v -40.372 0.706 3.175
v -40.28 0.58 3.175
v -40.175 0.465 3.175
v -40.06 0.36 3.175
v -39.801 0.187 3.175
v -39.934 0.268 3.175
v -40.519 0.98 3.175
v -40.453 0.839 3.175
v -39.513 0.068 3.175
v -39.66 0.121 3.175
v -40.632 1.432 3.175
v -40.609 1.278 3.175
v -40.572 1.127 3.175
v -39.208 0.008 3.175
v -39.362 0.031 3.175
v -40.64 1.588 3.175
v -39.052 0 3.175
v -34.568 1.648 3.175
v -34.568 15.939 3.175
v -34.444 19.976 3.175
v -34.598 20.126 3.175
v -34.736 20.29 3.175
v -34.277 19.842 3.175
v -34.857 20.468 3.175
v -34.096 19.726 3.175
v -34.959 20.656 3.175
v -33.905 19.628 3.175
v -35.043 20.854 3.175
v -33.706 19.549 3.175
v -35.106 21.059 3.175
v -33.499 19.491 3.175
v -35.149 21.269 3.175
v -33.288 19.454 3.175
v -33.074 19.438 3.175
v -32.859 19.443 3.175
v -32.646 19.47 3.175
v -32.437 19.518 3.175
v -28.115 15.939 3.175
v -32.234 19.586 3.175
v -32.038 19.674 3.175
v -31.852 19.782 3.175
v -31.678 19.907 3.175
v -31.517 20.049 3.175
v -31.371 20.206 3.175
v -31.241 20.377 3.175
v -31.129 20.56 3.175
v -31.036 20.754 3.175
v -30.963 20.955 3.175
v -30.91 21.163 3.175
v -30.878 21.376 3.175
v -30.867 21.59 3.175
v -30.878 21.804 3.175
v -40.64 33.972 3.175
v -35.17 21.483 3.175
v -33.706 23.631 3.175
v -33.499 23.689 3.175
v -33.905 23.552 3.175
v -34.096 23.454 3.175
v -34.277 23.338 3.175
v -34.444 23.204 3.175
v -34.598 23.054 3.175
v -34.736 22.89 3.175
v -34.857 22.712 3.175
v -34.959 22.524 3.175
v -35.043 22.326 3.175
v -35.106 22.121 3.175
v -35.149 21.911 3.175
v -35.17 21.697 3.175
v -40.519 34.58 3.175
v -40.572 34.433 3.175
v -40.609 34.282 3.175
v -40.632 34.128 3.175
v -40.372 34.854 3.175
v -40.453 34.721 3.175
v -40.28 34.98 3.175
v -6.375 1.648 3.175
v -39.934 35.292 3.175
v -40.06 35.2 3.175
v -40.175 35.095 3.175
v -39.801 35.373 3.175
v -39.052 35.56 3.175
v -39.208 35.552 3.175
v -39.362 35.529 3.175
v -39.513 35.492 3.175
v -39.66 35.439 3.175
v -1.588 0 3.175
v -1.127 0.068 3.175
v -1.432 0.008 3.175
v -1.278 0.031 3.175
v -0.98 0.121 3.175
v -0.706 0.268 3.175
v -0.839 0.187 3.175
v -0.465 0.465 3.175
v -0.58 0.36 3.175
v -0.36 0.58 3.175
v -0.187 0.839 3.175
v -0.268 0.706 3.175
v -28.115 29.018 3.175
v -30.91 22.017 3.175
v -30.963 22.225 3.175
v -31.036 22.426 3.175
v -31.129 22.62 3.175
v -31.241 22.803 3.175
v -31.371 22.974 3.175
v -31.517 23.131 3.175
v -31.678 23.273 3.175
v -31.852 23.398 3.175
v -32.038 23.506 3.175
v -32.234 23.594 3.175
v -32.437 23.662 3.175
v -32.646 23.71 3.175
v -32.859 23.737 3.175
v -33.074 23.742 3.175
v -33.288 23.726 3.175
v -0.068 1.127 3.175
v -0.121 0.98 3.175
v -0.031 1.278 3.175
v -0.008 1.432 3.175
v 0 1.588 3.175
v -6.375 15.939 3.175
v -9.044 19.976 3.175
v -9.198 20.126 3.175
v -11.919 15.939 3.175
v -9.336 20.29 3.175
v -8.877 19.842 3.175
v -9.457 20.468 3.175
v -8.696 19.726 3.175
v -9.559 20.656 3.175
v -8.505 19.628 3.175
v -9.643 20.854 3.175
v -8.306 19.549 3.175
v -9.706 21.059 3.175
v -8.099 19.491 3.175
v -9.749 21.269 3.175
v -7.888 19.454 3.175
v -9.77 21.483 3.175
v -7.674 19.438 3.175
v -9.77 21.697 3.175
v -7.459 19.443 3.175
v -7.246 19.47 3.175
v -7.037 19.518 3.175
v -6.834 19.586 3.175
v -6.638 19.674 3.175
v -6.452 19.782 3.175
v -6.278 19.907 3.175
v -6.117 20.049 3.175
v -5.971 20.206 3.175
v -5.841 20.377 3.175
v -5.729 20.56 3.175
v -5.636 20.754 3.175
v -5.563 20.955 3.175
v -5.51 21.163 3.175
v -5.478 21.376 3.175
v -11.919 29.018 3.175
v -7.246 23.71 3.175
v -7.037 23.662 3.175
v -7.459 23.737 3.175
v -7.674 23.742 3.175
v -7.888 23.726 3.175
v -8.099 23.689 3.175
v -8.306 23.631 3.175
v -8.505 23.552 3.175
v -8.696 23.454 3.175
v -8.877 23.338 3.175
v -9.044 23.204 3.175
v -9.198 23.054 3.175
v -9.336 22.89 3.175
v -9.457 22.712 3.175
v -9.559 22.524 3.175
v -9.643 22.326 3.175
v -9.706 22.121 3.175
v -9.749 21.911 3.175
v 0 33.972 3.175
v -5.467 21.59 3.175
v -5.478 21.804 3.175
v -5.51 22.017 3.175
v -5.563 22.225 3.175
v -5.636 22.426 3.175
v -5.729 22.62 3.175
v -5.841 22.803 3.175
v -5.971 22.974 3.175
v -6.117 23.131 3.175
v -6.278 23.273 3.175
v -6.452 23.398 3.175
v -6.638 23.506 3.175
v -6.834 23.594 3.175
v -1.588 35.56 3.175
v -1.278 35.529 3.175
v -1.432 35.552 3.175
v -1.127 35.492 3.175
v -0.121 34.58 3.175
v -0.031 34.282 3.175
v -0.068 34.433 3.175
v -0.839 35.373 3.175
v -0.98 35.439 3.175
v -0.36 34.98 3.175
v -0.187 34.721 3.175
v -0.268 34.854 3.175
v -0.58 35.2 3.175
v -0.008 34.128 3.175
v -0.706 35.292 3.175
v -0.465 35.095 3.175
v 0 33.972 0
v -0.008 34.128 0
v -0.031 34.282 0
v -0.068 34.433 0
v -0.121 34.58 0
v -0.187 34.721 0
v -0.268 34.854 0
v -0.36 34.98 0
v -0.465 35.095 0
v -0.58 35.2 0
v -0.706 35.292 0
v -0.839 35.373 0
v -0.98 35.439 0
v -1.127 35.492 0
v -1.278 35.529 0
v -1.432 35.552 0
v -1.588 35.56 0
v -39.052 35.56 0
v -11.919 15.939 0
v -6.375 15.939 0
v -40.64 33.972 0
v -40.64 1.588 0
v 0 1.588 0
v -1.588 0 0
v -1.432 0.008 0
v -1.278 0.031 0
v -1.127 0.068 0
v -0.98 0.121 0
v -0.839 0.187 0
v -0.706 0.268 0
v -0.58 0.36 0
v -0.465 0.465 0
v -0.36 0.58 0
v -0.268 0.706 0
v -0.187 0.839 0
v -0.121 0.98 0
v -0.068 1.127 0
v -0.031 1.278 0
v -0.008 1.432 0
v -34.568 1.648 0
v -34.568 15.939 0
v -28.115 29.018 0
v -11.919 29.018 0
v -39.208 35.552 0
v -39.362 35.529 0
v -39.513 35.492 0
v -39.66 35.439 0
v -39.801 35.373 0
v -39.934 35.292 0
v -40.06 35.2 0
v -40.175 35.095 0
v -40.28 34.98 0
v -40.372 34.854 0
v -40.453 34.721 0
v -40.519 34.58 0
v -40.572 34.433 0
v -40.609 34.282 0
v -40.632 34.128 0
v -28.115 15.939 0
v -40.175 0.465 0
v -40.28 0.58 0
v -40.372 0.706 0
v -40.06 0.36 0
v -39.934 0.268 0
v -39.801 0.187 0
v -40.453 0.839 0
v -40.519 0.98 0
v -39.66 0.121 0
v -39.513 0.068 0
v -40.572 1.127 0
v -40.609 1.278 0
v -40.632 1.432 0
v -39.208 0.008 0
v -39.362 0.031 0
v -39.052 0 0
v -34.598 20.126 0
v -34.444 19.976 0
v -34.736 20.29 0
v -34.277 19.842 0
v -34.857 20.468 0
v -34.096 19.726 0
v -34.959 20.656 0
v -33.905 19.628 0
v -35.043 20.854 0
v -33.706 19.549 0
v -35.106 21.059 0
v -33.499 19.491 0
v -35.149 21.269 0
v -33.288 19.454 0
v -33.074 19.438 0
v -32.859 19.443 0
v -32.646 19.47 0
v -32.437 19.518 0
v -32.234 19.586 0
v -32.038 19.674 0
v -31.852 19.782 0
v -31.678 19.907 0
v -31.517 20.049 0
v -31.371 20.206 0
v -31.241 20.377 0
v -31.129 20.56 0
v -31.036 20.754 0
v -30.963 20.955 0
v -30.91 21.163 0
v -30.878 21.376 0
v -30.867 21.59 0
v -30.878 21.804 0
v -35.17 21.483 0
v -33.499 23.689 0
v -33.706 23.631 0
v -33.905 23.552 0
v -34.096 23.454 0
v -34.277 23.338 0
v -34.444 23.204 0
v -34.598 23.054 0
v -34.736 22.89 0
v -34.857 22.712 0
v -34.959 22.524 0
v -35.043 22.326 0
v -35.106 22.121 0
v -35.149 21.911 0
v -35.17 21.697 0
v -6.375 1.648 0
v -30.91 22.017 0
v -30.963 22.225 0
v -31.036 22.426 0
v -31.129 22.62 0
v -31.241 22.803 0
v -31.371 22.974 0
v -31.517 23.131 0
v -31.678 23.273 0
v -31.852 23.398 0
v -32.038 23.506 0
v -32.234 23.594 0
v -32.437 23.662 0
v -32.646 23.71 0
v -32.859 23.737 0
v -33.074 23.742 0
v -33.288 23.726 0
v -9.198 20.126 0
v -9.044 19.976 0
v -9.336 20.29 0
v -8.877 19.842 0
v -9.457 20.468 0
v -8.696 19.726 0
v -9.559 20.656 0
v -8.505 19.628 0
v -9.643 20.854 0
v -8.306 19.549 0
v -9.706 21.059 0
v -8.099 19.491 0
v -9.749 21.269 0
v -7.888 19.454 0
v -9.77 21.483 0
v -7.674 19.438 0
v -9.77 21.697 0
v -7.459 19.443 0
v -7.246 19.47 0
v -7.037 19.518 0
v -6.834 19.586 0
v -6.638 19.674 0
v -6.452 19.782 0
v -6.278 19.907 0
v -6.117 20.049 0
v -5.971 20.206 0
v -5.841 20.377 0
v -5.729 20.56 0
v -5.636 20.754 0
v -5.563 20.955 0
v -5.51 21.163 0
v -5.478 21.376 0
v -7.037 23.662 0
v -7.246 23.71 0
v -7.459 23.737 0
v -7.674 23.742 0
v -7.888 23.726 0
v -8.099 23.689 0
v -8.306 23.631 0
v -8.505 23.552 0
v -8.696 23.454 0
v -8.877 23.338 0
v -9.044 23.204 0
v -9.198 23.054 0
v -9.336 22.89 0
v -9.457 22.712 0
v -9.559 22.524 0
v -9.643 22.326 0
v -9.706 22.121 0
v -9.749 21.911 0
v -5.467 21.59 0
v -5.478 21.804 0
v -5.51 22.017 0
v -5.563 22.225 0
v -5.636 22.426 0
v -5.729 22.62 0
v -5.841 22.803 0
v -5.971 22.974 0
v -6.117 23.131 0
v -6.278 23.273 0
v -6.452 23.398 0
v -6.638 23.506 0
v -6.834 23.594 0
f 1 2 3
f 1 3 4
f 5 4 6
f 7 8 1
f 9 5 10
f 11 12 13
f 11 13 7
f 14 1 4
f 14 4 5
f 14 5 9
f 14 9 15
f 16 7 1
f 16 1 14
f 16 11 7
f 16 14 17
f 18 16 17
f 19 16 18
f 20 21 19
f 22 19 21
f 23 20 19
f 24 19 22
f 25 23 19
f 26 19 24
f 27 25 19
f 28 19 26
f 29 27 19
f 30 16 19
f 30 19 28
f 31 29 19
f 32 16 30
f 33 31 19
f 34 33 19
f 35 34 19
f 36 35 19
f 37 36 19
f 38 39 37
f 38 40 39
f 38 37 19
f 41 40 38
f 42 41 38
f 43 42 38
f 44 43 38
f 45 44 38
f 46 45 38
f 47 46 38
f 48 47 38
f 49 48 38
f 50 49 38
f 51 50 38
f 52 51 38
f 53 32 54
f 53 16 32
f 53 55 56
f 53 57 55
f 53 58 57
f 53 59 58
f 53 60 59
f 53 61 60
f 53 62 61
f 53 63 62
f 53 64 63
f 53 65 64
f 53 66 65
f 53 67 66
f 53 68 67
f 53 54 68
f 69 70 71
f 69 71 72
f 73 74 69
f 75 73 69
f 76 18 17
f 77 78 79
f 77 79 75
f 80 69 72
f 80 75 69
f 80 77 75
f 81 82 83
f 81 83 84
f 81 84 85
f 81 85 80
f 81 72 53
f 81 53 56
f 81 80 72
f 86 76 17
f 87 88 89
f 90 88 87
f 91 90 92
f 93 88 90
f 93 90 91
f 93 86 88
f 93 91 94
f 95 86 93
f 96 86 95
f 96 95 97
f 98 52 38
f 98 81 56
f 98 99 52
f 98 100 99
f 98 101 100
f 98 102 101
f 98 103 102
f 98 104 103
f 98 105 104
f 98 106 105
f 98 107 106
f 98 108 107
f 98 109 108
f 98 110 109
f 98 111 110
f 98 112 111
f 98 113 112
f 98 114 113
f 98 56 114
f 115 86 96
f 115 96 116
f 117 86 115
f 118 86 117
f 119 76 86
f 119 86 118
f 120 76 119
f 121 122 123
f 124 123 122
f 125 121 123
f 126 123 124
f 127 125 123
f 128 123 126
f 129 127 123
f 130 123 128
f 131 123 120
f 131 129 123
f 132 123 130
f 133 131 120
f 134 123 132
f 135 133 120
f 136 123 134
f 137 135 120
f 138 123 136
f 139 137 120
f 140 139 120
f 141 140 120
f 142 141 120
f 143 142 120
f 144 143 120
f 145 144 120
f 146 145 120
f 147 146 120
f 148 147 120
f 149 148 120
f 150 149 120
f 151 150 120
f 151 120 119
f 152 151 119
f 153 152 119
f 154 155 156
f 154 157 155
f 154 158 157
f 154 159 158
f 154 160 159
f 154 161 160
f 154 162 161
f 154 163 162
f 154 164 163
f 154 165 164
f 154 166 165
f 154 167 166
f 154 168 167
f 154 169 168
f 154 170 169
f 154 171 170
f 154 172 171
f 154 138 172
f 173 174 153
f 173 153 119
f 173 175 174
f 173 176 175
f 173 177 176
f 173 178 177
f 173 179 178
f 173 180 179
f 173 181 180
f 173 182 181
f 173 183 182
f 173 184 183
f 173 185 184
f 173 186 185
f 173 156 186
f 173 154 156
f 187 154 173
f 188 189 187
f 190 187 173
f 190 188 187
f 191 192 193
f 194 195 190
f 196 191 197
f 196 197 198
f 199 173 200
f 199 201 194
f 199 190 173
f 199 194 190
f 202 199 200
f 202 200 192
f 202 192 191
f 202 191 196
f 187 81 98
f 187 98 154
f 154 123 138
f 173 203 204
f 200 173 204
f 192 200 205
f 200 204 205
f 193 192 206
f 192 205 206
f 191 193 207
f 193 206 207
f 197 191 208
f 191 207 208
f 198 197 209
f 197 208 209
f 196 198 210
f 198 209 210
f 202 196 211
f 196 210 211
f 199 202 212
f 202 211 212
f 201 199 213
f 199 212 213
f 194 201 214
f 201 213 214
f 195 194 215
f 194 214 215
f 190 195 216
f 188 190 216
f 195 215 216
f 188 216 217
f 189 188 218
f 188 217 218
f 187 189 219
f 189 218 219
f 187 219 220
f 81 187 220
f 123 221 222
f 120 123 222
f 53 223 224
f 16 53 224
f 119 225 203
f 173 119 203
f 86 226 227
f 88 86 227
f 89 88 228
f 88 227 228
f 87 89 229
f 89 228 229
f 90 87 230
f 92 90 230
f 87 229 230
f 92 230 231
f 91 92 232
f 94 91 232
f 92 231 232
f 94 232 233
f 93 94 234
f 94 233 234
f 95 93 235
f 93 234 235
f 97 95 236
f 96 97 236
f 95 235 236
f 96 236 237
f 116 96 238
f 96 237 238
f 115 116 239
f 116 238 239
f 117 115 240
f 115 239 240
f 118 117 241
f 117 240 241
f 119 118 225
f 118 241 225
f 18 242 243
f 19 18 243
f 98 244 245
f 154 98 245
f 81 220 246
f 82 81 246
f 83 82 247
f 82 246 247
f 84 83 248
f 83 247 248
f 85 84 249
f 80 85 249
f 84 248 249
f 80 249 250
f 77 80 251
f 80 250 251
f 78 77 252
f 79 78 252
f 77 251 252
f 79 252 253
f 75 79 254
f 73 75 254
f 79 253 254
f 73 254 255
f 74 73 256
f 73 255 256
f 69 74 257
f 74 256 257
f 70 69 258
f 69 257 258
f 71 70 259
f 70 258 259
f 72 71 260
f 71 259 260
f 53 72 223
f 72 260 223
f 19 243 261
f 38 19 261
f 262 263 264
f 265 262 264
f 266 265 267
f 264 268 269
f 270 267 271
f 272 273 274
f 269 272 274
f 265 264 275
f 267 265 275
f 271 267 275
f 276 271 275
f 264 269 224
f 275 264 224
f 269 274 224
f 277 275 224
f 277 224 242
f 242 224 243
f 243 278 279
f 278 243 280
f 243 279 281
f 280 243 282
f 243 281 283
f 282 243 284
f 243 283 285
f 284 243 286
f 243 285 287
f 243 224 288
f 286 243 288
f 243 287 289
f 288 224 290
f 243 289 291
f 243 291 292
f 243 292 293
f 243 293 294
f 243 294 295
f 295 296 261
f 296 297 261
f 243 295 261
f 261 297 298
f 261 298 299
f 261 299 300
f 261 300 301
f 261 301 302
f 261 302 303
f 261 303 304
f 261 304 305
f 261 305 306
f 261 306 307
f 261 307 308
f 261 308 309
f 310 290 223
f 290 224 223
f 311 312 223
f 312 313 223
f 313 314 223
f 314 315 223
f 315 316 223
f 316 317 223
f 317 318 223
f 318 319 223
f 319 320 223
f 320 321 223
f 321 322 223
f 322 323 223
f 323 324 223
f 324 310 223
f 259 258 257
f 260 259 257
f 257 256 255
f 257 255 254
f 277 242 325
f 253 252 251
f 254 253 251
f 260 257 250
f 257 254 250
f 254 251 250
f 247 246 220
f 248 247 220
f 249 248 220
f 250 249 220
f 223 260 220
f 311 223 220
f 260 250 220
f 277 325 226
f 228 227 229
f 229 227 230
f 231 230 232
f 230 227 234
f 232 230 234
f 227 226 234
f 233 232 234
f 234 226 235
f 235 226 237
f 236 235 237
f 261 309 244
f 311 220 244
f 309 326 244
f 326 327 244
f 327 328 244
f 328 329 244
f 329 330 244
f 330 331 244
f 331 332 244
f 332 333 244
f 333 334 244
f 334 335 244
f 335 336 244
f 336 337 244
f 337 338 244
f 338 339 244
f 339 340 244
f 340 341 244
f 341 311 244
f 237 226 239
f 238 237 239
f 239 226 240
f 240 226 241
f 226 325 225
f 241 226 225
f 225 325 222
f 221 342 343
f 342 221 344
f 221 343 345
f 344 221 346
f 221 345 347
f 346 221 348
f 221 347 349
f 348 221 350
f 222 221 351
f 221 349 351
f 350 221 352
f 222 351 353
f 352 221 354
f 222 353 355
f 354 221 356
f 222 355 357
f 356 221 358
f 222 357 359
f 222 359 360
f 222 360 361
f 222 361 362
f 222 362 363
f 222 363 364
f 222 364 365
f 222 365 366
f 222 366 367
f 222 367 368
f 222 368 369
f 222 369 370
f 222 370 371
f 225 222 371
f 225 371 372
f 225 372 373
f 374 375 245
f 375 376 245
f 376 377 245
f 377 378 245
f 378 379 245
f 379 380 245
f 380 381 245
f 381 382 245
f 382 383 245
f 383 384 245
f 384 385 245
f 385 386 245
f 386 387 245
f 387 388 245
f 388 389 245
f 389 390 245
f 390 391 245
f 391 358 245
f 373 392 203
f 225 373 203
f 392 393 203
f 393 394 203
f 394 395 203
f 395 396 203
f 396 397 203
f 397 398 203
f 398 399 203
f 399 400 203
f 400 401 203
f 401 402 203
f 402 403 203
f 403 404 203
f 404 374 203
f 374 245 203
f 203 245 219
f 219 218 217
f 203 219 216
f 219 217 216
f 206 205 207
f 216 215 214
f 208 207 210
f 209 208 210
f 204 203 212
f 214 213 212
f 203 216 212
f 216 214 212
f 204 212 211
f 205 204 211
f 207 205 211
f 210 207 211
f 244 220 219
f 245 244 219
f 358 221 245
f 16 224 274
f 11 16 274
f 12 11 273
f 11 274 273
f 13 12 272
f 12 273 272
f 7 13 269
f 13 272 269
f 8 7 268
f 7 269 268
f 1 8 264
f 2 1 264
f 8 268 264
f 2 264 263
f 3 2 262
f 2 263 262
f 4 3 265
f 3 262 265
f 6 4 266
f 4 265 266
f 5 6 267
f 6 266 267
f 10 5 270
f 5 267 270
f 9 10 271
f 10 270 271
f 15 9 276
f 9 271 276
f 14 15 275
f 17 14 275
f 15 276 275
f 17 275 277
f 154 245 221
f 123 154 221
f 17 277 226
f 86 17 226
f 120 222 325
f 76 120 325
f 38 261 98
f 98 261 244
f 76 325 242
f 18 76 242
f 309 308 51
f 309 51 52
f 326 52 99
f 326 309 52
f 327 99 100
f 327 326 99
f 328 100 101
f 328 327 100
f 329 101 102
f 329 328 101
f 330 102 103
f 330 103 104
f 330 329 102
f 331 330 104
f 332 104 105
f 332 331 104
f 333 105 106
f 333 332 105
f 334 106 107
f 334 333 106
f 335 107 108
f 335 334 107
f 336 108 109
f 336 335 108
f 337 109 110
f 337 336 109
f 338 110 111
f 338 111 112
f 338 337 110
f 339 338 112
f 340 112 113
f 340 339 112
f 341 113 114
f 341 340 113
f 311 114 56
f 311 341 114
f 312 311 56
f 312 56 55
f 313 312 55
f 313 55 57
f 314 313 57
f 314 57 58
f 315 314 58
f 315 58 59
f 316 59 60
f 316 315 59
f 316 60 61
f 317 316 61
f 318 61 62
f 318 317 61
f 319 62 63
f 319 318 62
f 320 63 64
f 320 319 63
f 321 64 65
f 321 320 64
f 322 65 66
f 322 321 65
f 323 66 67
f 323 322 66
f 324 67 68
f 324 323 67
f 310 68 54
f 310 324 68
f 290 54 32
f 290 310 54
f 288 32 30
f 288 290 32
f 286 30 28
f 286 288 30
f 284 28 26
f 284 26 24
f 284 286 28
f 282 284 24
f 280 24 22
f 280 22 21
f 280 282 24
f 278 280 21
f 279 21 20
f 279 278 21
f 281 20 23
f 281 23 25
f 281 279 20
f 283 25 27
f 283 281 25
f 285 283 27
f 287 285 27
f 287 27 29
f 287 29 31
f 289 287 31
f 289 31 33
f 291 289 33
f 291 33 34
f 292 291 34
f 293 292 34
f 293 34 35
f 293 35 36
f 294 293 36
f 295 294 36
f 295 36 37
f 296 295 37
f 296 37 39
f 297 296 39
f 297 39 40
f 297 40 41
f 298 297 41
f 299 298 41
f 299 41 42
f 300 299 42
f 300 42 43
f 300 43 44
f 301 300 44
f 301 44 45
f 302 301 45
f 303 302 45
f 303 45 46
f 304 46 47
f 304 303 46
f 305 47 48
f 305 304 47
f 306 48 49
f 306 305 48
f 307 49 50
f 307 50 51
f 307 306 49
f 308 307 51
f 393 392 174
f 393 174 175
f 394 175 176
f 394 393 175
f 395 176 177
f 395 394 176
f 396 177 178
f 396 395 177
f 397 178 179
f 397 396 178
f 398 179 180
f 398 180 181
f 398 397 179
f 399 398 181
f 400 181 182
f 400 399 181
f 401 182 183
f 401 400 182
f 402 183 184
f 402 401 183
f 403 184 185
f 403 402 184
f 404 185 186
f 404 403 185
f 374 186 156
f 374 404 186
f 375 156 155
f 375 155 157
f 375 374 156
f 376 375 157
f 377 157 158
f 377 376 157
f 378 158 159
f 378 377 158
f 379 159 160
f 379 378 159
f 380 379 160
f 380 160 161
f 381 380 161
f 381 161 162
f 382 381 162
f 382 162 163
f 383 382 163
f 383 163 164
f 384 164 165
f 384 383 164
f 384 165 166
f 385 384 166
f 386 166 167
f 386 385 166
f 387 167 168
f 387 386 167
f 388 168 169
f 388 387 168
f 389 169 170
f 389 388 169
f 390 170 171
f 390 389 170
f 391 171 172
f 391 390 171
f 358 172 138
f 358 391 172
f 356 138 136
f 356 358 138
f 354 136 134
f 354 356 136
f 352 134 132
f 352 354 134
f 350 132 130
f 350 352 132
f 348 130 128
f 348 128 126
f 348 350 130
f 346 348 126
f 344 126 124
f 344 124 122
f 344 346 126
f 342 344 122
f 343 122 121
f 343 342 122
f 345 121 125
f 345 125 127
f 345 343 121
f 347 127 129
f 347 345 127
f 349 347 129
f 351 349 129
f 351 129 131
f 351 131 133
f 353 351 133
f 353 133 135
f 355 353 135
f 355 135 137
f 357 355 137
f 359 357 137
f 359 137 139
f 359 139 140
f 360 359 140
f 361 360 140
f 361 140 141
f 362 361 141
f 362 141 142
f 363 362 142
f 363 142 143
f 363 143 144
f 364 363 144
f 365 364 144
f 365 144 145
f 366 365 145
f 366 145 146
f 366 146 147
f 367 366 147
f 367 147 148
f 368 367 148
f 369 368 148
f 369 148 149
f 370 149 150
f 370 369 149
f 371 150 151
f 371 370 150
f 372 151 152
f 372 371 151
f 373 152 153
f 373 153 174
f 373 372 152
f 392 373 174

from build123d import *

# Parameters (mm, degrees)
SKETCH1_R           = 2.15265
BOSS_EXTRUDE1_DEPTH = 3.175
CUT_EXTRUDE1_DEPTH  = 55.094397353


with BuildPart() as part:
    # Sketch1 → Boss-Extrude1 (new body)
    with BuildSketch(Plane.XY):
        with BuildLine():
            Line((0, 1.5875), (0, 33.9725))
            ThreePointArc((0, 33.9725), (-0.464967985, 35.095032015), (-1.5875, 35.56))
            Line((-1.5875, 35.56), (-39.0525, 35.56))
            ThreePointArc((-39.0525, 35.56), (-40.175032015, 35.095032015), (-40.64, 33.9725))
            Line((-40.64, 33.9725), (-40.64, 1.5875))
            ThreePointArc((-40.64, 1.5875), (-40.175032015, 0.464967985), (-39.0525, 0))
            Line((-39.0525, 0), (-1.5875, 0))
            ThreePointArc((-1.5875, 0), (-0.464967985, 0.464967985), (0, 1.5875))
        make_face()
        with Locations((-7.62, 21.59)):
            Circle(SKETCH1_R, mode=Mode.SUBTRACT)
        with Locations((-33.02, 21.59)):
            Circle(SKETCH1_R, mode=Mode.SUBTRACT)
    extrude(amount=BOSS_EXTRUDE1_DEPTH)

    # Sketch2 → Cut-Extrude1 (cut, through all)
    with BuildSketch(Plane(origin=(0, 0, 0), x_dir=(-1, 0, 0), z_dir=(0, 0, -1))):
        Polygon((11.91856275, 15.939478953), (6.375346419, 15.939478953), (6.375346419, 1.648374352), (34.567798224, 1.648374352), (34.567798224, 15.939478953), (28.115147964, 15.939478953), (28.115147964, 29.018004982), (11.91856275, 29.018004982), align=None)
    extrude(amount=-CUT_EXTRUDE1_DEPTH, mode=Mode.SUBTRACT)


solid = part.part
